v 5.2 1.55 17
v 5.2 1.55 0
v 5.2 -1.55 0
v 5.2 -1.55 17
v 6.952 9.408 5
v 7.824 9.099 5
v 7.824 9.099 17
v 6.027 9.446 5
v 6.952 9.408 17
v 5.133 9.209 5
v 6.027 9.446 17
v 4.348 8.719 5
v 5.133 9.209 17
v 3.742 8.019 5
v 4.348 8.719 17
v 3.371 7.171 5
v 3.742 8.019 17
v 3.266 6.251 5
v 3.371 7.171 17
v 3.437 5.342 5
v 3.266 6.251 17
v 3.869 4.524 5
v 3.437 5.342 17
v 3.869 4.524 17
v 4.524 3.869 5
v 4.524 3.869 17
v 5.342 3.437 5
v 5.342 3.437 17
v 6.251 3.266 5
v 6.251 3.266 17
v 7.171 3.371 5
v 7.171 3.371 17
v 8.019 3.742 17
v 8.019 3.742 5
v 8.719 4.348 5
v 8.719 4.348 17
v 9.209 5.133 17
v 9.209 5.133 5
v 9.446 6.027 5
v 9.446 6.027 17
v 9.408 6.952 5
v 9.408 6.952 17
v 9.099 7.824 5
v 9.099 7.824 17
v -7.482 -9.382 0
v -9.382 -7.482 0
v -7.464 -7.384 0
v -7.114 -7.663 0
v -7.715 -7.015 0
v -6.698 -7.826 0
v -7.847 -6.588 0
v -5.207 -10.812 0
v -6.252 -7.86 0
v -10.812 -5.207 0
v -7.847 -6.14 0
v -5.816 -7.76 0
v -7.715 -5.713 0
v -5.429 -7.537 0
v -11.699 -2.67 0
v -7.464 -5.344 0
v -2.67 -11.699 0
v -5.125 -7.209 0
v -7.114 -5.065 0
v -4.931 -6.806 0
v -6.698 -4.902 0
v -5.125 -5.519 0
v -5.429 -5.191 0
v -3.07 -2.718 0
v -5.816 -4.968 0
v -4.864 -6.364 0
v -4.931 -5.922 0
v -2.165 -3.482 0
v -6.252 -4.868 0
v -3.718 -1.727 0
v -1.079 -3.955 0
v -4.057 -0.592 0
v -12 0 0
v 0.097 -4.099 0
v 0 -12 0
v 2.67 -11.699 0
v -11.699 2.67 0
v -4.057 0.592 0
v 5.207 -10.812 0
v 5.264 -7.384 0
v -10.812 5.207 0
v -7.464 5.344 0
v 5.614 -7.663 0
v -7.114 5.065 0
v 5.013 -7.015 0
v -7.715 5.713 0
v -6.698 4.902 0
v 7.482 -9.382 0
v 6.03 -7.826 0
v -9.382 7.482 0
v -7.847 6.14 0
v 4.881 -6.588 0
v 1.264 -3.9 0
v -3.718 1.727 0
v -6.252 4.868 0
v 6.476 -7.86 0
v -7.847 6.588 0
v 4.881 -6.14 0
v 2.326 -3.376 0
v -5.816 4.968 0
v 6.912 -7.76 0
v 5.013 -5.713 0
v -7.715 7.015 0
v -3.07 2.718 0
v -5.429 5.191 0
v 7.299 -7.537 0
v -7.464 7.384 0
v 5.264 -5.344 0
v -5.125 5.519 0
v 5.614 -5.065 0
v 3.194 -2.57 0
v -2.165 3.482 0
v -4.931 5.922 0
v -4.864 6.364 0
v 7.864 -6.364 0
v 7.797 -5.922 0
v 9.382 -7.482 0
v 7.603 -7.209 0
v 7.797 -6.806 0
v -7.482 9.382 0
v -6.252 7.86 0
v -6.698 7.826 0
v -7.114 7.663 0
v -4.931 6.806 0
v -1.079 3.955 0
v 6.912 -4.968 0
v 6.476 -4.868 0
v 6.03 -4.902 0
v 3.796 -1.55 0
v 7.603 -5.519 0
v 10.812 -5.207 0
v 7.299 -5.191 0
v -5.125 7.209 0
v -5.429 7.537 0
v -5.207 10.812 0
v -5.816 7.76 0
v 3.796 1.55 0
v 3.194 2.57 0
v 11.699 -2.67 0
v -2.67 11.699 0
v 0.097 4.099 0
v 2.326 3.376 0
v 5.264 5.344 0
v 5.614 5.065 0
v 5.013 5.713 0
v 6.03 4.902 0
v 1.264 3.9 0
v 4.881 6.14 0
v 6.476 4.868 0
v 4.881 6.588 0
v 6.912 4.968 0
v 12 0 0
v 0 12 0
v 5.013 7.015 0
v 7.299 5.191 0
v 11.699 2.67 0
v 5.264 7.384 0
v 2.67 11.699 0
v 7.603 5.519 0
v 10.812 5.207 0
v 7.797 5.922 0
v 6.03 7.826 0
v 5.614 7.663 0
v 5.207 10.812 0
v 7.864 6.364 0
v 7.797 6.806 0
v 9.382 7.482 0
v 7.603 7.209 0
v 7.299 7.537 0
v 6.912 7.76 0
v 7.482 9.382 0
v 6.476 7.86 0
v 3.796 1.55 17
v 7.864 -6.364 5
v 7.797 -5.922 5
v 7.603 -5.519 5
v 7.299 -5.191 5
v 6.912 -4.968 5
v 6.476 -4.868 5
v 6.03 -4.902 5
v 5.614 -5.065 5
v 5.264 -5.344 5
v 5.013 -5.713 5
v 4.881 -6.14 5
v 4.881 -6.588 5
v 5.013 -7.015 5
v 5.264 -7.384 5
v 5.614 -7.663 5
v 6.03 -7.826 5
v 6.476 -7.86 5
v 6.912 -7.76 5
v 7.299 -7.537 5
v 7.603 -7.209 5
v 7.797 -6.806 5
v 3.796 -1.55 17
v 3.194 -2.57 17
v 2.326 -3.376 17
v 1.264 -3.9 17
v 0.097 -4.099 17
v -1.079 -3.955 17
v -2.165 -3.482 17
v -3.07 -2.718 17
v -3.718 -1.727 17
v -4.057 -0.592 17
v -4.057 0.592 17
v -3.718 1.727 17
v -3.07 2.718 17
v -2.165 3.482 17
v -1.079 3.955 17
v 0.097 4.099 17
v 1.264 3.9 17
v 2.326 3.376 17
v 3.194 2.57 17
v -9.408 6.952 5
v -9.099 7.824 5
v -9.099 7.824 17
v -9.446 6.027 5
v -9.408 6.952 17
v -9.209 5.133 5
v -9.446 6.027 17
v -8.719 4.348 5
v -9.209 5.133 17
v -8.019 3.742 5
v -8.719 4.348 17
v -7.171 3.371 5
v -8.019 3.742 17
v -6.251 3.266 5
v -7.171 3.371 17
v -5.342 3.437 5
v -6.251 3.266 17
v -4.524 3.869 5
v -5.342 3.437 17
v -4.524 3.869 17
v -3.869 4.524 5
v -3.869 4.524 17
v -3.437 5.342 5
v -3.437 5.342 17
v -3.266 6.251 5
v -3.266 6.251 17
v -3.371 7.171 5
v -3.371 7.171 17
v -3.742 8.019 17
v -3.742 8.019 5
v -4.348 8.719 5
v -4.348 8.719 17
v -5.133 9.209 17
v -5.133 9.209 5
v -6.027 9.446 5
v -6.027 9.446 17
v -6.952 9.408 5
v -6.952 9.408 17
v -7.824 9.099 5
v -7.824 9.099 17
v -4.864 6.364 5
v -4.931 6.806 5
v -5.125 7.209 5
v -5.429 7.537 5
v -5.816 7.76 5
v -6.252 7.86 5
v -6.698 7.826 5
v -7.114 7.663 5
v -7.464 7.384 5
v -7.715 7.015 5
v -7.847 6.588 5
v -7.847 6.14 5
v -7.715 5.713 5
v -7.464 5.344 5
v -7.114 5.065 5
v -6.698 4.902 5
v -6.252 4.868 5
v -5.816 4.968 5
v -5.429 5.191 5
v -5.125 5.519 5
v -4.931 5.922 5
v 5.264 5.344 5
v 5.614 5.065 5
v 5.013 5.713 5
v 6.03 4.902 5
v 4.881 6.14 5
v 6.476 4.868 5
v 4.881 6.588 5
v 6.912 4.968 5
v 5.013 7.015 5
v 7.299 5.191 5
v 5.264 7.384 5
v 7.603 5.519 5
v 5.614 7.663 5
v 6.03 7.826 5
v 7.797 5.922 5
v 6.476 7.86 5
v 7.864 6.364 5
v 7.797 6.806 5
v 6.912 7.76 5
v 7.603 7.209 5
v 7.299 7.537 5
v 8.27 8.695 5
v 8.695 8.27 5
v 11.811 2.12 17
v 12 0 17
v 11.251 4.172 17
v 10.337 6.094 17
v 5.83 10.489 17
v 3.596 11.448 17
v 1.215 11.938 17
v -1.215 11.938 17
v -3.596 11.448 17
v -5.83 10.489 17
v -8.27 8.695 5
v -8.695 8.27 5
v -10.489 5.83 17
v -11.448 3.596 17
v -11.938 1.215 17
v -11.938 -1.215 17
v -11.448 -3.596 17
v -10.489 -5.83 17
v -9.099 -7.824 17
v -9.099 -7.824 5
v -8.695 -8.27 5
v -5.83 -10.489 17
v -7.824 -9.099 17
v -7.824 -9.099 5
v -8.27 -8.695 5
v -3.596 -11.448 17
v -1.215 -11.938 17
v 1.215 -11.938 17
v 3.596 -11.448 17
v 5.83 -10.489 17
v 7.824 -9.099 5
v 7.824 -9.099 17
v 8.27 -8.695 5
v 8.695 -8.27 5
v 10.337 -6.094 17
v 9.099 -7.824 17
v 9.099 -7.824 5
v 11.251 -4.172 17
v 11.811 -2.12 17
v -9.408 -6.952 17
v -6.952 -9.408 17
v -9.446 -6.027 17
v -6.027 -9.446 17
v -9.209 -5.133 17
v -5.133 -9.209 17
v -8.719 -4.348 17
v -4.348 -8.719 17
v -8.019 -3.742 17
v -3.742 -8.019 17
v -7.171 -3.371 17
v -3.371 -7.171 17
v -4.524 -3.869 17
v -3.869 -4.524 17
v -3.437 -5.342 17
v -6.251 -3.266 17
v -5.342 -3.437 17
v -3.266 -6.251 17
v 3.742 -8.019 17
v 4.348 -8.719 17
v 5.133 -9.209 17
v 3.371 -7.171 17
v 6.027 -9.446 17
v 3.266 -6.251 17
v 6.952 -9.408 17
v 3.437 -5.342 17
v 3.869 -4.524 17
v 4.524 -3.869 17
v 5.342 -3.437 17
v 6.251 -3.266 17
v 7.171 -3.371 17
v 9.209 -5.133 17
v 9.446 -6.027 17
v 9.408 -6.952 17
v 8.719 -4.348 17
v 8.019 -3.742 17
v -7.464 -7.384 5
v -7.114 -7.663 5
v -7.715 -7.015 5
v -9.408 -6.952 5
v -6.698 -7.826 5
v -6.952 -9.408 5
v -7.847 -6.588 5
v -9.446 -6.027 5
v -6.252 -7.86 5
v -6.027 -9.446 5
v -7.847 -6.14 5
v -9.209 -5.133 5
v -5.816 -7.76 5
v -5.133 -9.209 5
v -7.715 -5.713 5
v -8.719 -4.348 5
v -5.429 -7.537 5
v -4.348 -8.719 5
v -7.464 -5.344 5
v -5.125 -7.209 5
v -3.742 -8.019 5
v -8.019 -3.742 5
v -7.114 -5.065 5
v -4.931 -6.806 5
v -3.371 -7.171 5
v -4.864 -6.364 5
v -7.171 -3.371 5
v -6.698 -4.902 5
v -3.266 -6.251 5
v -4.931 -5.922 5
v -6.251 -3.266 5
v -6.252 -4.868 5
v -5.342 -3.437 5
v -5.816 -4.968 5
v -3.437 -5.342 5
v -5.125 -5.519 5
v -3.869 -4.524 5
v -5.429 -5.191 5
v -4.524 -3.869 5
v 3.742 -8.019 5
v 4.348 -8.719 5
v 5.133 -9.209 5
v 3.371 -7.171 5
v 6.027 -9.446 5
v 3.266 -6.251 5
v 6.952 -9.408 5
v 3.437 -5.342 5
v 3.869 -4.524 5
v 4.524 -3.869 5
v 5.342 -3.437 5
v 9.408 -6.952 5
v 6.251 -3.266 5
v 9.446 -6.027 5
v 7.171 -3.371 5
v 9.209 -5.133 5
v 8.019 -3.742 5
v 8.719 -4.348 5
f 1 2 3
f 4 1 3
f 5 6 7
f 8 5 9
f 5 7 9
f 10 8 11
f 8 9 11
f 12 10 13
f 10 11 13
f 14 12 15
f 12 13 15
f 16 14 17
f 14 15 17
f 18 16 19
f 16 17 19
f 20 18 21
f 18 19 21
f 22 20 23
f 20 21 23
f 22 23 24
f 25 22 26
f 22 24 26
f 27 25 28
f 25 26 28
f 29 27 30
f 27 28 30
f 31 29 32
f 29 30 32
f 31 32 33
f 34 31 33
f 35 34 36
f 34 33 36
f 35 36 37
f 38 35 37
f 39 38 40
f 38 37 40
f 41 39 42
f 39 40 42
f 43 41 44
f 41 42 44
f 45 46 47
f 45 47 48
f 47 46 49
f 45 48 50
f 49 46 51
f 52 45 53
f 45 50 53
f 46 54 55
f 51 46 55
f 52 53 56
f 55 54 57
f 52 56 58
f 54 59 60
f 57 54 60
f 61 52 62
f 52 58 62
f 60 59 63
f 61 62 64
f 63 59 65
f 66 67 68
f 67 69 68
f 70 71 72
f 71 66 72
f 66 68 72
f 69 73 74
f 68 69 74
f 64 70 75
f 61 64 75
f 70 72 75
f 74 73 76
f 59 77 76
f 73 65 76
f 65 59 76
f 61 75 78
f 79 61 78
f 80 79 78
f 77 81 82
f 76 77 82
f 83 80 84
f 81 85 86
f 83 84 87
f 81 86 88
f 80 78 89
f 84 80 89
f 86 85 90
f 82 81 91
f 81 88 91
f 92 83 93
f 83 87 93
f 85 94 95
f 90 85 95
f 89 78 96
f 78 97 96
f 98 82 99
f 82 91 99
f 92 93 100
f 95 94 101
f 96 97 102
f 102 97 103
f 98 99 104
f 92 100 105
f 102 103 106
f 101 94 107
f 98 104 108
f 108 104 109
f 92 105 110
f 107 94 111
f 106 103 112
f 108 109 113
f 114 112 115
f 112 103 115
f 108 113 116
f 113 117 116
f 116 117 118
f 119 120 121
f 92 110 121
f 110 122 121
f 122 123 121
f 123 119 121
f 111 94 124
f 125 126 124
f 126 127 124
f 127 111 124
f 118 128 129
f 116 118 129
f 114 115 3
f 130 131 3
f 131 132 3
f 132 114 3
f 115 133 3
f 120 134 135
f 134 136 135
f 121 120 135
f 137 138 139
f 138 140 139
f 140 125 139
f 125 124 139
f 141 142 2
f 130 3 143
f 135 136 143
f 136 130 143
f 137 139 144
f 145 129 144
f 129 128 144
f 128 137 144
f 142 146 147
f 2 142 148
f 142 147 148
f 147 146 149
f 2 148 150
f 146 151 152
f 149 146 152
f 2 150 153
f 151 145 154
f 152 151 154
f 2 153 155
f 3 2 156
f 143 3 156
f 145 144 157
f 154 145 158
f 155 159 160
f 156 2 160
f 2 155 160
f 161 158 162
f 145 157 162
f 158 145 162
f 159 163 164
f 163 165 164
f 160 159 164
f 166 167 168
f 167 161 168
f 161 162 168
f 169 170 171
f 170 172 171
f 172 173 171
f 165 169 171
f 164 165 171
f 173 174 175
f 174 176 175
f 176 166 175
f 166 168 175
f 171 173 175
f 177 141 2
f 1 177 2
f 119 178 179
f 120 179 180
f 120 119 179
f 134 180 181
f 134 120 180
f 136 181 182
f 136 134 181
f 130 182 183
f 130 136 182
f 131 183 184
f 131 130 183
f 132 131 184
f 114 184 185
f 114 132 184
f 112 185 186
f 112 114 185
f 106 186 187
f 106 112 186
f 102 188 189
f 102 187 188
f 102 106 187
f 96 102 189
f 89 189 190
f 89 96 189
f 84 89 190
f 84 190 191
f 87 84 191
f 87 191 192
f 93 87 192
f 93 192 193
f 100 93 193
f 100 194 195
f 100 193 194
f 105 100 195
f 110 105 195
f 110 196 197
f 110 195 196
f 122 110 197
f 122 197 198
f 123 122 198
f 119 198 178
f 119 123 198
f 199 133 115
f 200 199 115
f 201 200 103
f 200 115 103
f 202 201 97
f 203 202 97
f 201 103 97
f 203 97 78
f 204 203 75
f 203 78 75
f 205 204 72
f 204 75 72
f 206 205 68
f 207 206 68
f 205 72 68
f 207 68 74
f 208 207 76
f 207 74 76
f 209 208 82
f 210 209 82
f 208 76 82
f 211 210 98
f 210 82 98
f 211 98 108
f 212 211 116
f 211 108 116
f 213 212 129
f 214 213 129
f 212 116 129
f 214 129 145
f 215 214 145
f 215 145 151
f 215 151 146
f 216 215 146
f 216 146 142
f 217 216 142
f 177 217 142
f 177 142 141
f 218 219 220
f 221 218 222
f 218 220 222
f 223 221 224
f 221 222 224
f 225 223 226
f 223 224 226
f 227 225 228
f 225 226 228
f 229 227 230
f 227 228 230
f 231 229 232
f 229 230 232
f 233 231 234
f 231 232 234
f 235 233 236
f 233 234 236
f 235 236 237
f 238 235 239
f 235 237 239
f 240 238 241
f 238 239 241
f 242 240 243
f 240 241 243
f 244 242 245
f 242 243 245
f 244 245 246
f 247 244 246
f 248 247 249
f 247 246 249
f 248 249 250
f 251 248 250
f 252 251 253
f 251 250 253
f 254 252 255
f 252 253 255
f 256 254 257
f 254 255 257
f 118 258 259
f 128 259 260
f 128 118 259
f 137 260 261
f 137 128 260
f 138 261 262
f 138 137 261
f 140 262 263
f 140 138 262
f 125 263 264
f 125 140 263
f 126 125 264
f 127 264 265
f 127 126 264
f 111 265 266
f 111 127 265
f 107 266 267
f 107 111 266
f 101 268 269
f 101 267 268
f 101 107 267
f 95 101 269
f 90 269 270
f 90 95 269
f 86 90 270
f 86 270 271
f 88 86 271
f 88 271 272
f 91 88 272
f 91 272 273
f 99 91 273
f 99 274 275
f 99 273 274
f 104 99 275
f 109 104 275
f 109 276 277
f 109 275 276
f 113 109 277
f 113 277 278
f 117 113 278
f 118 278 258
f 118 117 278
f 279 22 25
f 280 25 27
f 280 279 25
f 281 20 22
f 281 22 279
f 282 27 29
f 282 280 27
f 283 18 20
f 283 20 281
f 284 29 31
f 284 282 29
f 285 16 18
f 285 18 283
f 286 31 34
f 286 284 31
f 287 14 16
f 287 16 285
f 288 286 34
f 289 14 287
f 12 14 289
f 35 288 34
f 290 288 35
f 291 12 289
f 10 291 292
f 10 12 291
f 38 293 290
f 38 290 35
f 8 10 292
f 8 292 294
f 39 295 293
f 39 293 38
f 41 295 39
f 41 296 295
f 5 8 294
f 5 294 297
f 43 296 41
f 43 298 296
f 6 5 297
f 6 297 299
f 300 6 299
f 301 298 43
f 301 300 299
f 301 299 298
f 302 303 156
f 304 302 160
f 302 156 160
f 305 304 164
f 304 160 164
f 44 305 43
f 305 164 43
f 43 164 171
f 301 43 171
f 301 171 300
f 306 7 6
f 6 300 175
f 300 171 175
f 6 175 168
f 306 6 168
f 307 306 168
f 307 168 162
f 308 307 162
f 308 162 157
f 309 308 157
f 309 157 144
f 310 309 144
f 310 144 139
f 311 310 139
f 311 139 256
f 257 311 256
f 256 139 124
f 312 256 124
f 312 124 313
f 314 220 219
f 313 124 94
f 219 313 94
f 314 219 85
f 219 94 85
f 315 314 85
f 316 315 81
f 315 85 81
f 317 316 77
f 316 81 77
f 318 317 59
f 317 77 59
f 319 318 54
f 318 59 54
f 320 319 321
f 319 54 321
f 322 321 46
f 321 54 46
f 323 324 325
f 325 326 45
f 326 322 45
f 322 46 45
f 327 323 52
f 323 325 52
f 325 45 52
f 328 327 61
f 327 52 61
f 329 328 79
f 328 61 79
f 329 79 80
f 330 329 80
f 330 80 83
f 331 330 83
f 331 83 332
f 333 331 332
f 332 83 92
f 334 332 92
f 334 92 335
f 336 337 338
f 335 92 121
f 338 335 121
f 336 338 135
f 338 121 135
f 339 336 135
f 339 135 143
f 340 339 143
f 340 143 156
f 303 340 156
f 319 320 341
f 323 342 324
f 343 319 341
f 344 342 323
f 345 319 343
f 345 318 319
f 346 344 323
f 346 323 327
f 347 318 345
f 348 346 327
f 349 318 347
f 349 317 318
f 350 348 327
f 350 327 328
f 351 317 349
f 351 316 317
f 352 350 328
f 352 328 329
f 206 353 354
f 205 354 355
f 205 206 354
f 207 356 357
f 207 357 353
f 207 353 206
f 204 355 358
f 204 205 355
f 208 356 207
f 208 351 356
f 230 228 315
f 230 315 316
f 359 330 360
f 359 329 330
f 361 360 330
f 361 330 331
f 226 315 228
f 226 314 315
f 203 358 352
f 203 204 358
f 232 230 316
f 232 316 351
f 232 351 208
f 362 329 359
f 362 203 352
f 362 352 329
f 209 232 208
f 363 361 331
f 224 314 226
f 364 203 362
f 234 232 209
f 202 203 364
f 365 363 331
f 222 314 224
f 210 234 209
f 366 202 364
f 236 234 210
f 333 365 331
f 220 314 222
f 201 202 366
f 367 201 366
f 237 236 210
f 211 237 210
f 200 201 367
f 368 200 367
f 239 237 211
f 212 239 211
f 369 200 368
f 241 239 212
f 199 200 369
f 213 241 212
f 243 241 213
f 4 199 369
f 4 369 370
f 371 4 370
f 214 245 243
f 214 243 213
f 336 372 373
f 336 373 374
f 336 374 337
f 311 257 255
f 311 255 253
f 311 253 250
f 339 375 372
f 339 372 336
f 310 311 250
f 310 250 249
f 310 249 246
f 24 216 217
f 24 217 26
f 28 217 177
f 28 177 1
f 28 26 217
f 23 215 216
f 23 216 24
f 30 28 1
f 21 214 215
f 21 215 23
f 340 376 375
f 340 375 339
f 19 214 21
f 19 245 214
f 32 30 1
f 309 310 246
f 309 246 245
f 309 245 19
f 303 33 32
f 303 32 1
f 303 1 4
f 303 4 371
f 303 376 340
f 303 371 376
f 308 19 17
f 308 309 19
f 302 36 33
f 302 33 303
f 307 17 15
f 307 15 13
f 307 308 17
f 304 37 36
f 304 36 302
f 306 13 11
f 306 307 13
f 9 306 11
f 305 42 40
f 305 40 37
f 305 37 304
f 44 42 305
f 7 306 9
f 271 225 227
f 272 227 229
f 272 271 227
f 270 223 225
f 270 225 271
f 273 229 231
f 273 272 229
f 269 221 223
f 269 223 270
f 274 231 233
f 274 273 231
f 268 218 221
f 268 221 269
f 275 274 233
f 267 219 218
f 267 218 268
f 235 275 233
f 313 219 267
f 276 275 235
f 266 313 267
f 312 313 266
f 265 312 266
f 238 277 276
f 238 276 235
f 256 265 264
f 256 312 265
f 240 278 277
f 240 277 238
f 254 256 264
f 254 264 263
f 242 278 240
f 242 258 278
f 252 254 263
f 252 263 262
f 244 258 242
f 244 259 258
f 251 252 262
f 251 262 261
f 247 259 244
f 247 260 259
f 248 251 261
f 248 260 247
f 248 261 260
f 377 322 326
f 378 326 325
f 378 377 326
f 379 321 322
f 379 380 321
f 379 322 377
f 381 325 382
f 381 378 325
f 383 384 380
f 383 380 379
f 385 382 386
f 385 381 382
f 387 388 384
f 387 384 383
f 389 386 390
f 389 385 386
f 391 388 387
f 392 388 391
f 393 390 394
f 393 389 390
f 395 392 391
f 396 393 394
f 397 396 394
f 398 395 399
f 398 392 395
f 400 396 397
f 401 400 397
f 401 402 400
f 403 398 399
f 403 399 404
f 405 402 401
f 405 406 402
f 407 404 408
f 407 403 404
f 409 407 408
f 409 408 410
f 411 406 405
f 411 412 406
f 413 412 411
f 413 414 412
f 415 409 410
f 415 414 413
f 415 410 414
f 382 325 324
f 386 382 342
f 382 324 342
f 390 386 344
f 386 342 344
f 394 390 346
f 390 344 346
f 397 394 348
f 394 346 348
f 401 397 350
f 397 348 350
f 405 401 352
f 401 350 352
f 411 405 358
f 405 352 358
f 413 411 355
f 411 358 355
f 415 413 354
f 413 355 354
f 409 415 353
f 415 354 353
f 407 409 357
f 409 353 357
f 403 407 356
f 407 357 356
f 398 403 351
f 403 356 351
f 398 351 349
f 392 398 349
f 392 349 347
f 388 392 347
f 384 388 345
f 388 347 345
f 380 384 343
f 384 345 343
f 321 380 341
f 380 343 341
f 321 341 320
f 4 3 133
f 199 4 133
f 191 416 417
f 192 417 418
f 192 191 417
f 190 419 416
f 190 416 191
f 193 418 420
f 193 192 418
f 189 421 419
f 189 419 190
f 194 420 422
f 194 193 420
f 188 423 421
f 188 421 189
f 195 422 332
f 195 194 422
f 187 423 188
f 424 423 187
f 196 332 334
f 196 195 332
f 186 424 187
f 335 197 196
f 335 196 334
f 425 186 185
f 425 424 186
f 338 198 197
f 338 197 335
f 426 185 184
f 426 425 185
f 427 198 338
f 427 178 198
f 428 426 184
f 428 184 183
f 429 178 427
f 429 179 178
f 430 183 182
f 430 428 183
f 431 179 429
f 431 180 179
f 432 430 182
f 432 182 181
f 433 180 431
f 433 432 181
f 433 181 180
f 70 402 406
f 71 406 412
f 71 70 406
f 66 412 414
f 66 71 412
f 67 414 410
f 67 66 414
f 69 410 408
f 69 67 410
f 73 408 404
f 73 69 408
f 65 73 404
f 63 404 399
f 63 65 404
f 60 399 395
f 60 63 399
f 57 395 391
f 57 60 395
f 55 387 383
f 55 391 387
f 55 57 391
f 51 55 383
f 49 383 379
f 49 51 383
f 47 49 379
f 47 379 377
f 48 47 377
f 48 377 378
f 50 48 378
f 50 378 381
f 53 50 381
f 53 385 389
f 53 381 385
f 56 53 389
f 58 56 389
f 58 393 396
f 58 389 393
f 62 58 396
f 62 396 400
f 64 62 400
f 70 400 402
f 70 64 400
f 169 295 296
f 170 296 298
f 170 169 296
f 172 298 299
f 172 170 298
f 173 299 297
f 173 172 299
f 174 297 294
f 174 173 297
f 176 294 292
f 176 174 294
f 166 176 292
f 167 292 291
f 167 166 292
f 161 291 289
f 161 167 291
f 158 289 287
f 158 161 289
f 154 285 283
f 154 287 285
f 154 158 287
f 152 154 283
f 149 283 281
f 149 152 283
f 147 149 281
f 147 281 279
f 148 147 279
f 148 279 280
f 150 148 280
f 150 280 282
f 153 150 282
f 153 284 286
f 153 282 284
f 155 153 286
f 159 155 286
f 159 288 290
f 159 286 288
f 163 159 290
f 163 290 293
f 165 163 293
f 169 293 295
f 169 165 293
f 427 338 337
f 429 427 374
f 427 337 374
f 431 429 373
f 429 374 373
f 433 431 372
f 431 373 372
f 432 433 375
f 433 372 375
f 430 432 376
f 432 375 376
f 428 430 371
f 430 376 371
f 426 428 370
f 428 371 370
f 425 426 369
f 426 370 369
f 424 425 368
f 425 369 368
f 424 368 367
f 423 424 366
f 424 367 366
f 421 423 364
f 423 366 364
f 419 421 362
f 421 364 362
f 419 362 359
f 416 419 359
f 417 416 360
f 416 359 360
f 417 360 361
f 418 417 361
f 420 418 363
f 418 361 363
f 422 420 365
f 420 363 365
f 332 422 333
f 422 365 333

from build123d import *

# Parameters (mm, degrees)
SKIZZE1_R                       = 12
SKIZZE1_R_2                     = 1.5
AUFSATZ_LINEAR_AUSTRAGEN1_DEPTH = 17
SKIZZE2_R                       = 3.1
SCHNITT_LINEAR_AUSTRAGEN2_DEPTH = 12


with BuildPart() as part:
    # Skizze1 → Aufsatz-Linear austragen1 (new body)
    with BuildSketch(Plane.XY):
        Circle(SKIZZE1_R)
        with Locations((6.363961031, 6.363961031)):
            Circle(SKIZZE1_R_2, mode=Mode.SUBTRACT)
        with Locations((-6.363961031, 6.363961031)):
            Circle(SKIZZE1_R_2, mode=Mode.SUBTRACT)
        with Locations((-6.363961031, -6.363961031)):
            Circle(SKIZZE1_R_2, mode=Mode.SUBTRACT)
        with Locations((6.363961031, -6.363961031)):
            Circle(SKIZZE1_R_2, mode=Mode.SUBTRACT)
        with BuildLine():
            ThreePointArc((3.795721275, -1.55), (-4.1, 0), (3.795721275, 1.55))
            Line((3.795721275, 1.55), (5.2, 1.55))
            Line((5.2, 1.55), (5.2, -1.55))
            Line((5.2, -1.55), (3.795721275, -1.55))
        make_face(mode=Mode.SUBTRACT)
    extrude(amount=AUFSATZ_LINEAR_AUSTRAGEN1_DEPTH)

    # Skizze2 → Schnitt-Linear austragen2 (cut)
    with BuildSketch(Plane.XY.offset(17)):
        with Locations((-6.363961031, 6.363961031)):
            Circle(SKIZZE2_R)
        with Locations((6.363961031, 6.363961031)):
            Circle(SKIZZE2_R)
        with Locations((6.363961031, -6.363961031)):
            Circle(SKIZZE2_R)
        with Locations((-6.363961031, -6.363961031)):
            Circle(SKIZZE2_R)
    extrude(amount=-SCHNITT_LINEAR_AUSTRAGEN2_DEPTH, mode=Mode.SUBTRACT)


solid = part.part
